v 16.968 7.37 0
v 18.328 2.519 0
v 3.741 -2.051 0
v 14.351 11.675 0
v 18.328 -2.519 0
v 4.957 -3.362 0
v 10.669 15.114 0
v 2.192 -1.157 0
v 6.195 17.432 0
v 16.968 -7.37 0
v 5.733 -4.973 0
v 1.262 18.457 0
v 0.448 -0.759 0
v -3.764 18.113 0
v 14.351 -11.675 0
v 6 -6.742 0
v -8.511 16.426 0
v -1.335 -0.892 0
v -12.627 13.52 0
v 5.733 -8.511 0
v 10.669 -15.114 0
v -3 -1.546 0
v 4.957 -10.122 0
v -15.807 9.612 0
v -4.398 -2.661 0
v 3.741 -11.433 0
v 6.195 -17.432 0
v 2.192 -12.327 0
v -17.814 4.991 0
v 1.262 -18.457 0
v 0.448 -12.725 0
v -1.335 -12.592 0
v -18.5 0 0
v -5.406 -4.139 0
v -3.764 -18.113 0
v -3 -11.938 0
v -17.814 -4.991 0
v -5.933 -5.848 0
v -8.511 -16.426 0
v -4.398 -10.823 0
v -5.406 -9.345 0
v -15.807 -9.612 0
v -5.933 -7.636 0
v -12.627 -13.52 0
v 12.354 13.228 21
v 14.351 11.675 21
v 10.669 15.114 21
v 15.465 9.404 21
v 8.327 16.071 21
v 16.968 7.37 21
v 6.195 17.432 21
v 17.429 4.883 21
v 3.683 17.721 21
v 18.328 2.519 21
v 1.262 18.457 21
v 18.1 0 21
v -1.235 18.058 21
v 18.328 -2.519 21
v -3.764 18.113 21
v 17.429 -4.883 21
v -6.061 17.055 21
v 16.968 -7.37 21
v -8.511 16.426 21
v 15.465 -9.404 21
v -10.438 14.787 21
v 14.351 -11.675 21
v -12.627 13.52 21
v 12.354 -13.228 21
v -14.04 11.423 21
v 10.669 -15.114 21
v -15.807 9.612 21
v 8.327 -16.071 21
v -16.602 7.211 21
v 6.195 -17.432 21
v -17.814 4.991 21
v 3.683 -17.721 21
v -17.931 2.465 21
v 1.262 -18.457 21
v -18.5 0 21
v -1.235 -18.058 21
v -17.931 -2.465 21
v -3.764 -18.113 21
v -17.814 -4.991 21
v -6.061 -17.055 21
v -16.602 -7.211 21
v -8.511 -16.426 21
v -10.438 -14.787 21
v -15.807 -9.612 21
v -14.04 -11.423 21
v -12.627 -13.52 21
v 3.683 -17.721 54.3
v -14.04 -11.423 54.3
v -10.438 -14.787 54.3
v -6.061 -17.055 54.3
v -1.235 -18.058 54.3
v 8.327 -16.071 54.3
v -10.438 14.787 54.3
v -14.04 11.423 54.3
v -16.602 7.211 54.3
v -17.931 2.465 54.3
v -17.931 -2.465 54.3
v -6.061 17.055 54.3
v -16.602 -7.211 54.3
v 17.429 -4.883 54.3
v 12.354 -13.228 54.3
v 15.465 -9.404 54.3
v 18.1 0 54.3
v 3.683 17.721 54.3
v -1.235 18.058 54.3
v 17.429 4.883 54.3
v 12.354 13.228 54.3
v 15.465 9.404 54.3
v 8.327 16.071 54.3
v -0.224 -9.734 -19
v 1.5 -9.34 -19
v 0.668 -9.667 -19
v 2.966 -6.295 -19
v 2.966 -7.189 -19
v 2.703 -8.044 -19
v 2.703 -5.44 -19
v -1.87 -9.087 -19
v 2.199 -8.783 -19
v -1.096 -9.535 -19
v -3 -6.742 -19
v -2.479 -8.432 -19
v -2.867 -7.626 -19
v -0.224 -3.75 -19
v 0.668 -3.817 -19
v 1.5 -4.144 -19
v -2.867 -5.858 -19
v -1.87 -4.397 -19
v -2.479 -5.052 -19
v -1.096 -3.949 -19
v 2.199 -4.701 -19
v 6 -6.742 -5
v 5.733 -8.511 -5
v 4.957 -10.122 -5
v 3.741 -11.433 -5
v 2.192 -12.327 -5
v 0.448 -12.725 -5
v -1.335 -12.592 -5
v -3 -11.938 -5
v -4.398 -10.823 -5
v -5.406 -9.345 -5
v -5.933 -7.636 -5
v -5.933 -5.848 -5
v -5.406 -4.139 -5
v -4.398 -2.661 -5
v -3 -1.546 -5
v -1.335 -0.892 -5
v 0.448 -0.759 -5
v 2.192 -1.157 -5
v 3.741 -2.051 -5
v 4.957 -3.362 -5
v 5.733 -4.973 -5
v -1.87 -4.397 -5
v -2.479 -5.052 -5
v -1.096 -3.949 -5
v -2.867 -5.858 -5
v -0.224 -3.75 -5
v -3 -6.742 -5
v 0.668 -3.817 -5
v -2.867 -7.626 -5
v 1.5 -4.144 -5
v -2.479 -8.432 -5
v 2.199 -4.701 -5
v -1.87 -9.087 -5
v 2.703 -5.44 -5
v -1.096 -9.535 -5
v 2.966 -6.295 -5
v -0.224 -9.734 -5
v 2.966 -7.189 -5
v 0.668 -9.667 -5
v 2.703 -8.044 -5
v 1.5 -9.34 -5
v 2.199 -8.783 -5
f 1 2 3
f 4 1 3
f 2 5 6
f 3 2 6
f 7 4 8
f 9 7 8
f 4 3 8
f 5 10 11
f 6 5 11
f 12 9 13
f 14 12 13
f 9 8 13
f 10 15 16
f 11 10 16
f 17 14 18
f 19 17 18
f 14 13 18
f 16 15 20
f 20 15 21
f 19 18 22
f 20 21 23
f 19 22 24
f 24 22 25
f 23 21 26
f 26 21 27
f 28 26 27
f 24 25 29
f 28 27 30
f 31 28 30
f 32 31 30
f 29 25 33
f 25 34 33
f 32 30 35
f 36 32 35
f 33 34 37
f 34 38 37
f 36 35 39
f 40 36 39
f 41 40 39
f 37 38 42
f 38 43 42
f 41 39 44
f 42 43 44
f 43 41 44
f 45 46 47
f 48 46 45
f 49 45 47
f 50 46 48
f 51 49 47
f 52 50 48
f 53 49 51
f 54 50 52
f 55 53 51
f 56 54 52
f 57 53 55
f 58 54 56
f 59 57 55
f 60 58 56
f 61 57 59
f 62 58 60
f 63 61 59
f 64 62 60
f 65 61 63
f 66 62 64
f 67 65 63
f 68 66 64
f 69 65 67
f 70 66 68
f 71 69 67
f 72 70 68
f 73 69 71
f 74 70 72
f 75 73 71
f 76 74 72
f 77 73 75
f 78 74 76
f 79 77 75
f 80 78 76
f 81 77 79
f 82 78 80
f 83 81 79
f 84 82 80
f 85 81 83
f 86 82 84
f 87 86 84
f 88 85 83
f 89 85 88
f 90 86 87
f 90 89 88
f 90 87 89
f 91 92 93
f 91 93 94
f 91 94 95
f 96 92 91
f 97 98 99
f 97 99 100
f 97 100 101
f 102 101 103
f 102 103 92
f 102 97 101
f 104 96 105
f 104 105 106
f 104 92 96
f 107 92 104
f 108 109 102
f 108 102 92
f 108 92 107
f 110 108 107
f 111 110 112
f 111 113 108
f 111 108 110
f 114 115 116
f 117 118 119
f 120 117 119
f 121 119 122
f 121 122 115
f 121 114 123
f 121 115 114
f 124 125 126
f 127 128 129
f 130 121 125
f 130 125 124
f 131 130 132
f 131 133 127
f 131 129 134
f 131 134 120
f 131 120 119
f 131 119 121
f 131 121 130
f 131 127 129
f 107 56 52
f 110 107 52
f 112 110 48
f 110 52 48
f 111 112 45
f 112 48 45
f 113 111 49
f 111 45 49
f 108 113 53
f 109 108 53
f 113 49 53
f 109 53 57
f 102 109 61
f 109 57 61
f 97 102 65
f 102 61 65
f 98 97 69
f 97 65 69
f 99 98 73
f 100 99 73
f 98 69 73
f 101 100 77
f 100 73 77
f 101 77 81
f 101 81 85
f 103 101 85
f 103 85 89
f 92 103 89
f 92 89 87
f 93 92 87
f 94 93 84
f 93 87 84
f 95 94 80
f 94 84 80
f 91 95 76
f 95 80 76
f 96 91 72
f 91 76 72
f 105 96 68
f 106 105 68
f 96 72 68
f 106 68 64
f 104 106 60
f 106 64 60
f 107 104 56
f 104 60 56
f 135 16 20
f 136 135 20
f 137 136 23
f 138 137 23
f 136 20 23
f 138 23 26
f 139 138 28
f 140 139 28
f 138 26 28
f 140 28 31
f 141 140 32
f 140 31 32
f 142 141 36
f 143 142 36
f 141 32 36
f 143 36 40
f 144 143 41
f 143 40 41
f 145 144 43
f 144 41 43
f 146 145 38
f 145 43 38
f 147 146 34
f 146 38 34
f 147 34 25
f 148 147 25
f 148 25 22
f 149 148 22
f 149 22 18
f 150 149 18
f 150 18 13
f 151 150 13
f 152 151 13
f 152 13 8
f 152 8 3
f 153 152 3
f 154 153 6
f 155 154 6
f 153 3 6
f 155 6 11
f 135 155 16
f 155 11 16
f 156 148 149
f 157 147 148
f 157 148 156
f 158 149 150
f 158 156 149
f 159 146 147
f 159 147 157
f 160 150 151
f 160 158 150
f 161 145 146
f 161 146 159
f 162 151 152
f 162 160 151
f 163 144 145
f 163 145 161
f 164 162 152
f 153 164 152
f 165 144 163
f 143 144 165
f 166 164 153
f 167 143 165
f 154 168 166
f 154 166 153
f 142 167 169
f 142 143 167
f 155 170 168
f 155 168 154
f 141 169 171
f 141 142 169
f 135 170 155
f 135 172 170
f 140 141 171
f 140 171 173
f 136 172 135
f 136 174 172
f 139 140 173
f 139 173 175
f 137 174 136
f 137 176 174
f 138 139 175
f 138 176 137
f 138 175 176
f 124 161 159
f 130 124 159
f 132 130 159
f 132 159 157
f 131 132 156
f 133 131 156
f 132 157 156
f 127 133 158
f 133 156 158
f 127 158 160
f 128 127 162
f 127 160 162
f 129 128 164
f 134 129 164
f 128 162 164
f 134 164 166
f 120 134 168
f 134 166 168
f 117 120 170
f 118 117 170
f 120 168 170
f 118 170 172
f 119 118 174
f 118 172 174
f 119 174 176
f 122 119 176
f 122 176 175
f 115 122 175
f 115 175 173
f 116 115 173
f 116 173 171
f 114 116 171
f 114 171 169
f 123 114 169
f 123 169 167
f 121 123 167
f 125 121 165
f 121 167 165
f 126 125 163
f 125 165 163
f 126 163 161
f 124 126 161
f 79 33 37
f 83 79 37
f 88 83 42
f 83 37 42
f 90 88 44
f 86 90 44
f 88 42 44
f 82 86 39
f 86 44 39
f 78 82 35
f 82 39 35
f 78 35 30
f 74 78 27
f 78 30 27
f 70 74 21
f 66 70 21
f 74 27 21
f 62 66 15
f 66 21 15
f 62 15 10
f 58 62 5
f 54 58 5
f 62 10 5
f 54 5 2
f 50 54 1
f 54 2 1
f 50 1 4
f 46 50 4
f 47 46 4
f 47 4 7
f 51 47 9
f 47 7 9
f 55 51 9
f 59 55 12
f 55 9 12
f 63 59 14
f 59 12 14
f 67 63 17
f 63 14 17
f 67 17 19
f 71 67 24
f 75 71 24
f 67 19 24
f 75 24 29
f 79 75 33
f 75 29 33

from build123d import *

# Parameters (mm, degrees)
SKETCH1_R           = 18.5
INNER_DEPTH         = 21
SKETCH2_R           = 18.1
OUTER_DEPTH         = 33.3
SKETCH3_R           = 6
BOSS_EXTRUDE3_DEPTH = 5
SKETCH7_R           = 3
BOSS_EXTRUDE6_DEPTH = 14


with BuildPart() as part:
    # Sketch1 → Inner (new body)
    with BuildSketch(Plane.XY):
        with Locations(Location((0, 0, 0), (0, 0, 180))):
            Circle(SKETCH1_R)
    extrude(amount=INNER_DEPTH)

    # Sketch2 → Outer (add)
    with BuildSketch(Plane.XY.offset(21)):
        Circle(SKETCH2_R)
    extrude(amount=OUTER_DEPTH)

    # Sketch3 → Boss-Extrude3 (add)
    with BuildSketch(Plane(origin=(0, 0, 0), x_dir=(-1, 0, 0), z_dir=(0, 0, -1))):
        with Locations(Location((0, -6.742, 0), (0, 0, 180))):
            Circle(SKETCH3_R)
    extrude(amount=BOSS_EXTRUDE3_DEPTH)

    # Sketch7 → Boss-Extrude6 (add)
    with BuildSketch(Plane(origin=(0, 0, -5), x_dir=(-1, 0, 0), z_dir=(0, 0, -1))):
        with Locations((0, -6.742)):
            Circle(SKETCH7_R)
    extrude(amount=BOSS_EXTRUDE6_DEPTH)


solid = part.part
